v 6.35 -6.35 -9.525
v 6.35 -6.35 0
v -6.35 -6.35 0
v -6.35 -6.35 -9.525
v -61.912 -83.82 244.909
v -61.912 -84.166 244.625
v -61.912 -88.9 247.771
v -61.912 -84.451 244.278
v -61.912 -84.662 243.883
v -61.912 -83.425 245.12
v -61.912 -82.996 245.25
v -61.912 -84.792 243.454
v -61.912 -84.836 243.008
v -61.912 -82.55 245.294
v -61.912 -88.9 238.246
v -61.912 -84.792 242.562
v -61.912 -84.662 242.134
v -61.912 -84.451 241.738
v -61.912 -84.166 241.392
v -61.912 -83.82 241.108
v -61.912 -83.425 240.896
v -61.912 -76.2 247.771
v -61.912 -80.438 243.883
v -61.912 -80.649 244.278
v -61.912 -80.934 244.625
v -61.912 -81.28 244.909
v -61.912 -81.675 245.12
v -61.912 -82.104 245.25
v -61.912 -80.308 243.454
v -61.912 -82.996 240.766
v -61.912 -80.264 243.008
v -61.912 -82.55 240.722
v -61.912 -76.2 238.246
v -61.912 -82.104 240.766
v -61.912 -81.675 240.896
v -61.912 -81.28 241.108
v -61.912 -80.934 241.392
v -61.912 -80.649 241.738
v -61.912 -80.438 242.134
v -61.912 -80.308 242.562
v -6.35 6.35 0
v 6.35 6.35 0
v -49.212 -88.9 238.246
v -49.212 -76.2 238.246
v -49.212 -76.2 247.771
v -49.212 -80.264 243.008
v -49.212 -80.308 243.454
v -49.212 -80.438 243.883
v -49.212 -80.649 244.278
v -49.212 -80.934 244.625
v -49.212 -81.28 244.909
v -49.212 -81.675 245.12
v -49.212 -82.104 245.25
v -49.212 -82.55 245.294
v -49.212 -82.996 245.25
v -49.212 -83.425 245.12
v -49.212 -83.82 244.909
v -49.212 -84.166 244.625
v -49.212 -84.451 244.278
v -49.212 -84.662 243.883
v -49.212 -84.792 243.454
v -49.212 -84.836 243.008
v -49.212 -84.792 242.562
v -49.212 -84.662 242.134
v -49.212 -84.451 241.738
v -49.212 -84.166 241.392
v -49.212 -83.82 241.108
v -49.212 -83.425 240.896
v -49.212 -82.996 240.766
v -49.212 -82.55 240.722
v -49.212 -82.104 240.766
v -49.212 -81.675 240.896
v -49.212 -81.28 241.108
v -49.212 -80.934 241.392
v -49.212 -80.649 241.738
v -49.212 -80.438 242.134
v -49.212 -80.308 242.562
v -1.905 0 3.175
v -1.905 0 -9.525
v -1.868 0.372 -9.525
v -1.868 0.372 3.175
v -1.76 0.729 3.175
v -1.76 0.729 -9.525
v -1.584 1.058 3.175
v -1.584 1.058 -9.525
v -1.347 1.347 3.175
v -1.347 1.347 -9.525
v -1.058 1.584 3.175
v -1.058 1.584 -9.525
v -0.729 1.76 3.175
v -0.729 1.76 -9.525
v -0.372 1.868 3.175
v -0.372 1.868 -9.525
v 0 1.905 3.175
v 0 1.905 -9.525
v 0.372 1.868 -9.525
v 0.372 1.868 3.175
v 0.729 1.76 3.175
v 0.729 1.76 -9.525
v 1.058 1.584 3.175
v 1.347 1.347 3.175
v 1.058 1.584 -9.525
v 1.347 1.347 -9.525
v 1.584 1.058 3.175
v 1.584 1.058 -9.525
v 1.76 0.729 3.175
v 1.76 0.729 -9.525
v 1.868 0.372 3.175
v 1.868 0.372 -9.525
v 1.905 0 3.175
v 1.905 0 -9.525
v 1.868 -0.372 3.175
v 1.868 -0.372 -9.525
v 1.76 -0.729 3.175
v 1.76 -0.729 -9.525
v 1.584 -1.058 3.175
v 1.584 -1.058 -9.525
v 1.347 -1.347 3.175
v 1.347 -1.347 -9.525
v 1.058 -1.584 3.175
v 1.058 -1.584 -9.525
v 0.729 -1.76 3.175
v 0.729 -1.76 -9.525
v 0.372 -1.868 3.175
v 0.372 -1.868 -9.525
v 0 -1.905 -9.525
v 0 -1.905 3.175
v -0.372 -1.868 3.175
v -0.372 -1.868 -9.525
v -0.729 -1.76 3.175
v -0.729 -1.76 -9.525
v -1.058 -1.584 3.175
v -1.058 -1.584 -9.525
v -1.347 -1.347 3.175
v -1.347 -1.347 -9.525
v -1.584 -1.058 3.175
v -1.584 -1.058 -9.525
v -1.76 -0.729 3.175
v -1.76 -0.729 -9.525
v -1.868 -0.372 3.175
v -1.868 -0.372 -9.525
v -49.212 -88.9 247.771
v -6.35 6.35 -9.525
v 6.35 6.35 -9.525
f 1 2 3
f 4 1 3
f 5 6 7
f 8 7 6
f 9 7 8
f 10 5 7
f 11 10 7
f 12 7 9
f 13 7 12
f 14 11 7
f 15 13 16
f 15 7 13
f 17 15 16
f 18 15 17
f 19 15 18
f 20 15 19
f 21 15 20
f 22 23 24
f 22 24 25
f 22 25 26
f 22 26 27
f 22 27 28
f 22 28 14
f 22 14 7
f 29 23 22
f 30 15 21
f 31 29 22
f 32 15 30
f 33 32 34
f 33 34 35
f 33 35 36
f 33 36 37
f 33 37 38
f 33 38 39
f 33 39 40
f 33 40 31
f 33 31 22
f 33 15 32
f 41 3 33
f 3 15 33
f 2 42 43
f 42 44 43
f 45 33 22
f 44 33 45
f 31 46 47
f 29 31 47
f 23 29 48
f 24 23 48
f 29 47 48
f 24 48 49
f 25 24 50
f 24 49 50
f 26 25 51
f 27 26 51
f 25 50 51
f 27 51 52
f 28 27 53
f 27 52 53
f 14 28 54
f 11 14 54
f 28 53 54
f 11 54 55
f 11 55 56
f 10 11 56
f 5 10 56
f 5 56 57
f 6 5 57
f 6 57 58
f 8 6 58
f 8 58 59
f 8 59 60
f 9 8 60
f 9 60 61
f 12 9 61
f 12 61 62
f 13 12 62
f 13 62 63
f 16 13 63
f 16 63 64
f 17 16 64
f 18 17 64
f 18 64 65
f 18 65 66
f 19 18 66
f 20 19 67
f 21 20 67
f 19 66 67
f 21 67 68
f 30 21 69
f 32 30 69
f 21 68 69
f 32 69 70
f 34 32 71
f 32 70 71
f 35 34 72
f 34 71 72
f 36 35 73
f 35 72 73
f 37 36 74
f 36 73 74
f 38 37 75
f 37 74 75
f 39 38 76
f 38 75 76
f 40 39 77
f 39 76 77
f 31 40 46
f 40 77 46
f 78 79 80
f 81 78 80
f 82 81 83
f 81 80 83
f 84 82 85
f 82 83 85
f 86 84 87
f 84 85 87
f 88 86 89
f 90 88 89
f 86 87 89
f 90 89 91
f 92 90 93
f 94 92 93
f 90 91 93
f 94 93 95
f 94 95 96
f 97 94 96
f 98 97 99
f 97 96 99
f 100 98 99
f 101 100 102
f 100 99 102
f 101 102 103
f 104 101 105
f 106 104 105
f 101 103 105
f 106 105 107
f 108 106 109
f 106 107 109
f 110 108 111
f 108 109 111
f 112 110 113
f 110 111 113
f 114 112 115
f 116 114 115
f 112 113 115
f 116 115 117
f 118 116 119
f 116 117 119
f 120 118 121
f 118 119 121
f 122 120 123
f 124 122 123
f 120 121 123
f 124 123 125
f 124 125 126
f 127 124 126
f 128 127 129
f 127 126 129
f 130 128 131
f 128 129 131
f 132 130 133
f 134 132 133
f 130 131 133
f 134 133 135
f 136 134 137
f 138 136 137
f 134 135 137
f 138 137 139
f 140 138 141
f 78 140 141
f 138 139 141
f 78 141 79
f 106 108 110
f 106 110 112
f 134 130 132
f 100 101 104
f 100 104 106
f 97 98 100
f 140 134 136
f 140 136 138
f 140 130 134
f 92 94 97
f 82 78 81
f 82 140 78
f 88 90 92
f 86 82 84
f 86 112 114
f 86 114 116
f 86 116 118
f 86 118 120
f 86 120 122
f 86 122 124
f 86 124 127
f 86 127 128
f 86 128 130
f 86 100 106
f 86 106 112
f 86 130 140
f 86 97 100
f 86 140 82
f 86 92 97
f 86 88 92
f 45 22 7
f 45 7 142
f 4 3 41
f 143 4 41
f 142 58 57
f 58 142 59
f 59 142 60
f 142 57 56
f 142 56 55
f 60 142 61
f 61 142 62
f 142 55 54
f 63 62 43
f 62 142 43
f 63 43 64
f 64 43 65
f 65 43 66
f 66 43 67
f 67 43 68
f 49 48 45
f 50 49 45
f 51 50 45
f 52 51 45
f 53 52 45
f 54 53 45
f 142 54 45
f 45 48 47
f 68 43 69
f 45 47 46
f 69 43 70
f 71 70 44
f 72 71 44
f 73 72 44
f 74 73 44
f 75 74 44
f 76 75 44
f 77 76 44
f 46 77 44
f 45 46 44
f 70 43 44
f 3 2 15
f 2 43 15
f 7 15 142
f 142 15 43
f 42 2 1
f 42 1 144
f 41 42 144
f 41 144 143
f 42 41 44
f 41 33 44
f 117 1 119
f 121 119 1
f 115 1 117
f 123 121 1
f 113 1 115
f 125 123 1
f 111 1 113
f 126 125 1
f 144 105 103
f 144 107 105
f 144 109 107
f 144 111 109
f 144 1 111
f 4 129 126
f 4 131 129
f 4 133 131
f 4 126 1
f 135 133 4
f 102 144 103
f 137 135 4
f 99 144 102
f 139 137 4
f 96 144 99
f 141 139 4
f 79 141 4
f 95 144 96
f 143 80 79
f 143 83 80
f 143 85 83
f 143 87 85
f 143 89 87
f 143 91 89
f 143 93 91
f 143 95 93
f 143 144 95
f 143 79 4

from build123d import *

# Parameters (mm, degrees)
SKETCH28_W          = 12.7
SKETCH28_H          = 12.7
BOSS_EXTRUDE5_DEPTH = 9.525
SKETCH29_W          = 12.7
SKETCH29_H          = 12.7
BOSS_EXTRUDE6_DEPTH = 9.525
SKETCH30_R          = 2.286
CUT_EXTRUDE7_DEPTH  = 270.036783662
SKETCH31_R          = 1.905
CUT_EXTRUDE8_DEPTH  = 12.7


with BuildPart() as part:
    # Sketch26 → Loft1 section 0
    with BuildSketch(Plane.XY):
        with BuildLine():
            Line((-6.35, 6.35), (6.35, 6.35))
            Line((6.35, 6.35), (6.35, -6.35))
            Line((6.35, -6.35), (-6.35, -6.35))
            Line((-6.35, -6.35), (-6.35, 6.35))
        make_face()
    # Sketch27 → Loft1 section 1
    with BuildSketch(Plane.XY.offset(238.245840754)):
        with BuildLine():
            Line((-49.2125, -88.9), (-61.9125, -88.9))
            Line((-61.9125, -88.9), (-61.9125, -76.2))
            Line((-61.9125, -76.2), (-49.2125, -76.2))
            Line((-49.2125, -76.2), (-49.2125, -88.9))
        make_face()
    loft()

    # Sketch28 → Boss-Extrude5 (add)
    with BuildSketch(Plane(origin=(0, 0, 0), x_dir=(-1, 0, 0), z_dir=(0, 0, -1))):
        Rectangle(SKETCH28_W, SKETCH28_H)
    extrude(amount=BOSS_EXTRUDE5_DEPTH)

    # Sketch29 → Boss-Extrude6 (add)
    with BuildSketch(Plane.XY.offset(238.245840754)):
        with Locations((-55.5625, -82.55)):
            Rectangle(SKETCH29_W, SKETCH29_H)
    extrude(amount=BOSS_EXTRUDE6_DEPTH)

    # Sketch30 → Cut-Extrude7 (cut, through all)
    with BuildSketch(Plane(origin=(-49.2125, 0, 0), x_dir=(0, 0, -1), z_dir=(1, 0, 0))):
        with Locations(Location((-243.008340754, -82.55, 0), (0, 0, 90))):
            Circle(SKETCH30_R)
    extrude(amount=-CUT_EXTRUDE7_DEPTH, mode=Mode.SUBTRACT)

    # Sketch31 → Cut-Extrude8 (cut)
    with BuildSketch(Plane(origin=(0, 0, -9.525), x_dir=(-1, 0, 0), z_dir=(0, 0, -1))):
        Circle(SKETCH31_R)
    extrude(amount=-CUT_EXTRUDE8_DEPTH, mode=Mode.SUBTRACT)


solid = part.part
